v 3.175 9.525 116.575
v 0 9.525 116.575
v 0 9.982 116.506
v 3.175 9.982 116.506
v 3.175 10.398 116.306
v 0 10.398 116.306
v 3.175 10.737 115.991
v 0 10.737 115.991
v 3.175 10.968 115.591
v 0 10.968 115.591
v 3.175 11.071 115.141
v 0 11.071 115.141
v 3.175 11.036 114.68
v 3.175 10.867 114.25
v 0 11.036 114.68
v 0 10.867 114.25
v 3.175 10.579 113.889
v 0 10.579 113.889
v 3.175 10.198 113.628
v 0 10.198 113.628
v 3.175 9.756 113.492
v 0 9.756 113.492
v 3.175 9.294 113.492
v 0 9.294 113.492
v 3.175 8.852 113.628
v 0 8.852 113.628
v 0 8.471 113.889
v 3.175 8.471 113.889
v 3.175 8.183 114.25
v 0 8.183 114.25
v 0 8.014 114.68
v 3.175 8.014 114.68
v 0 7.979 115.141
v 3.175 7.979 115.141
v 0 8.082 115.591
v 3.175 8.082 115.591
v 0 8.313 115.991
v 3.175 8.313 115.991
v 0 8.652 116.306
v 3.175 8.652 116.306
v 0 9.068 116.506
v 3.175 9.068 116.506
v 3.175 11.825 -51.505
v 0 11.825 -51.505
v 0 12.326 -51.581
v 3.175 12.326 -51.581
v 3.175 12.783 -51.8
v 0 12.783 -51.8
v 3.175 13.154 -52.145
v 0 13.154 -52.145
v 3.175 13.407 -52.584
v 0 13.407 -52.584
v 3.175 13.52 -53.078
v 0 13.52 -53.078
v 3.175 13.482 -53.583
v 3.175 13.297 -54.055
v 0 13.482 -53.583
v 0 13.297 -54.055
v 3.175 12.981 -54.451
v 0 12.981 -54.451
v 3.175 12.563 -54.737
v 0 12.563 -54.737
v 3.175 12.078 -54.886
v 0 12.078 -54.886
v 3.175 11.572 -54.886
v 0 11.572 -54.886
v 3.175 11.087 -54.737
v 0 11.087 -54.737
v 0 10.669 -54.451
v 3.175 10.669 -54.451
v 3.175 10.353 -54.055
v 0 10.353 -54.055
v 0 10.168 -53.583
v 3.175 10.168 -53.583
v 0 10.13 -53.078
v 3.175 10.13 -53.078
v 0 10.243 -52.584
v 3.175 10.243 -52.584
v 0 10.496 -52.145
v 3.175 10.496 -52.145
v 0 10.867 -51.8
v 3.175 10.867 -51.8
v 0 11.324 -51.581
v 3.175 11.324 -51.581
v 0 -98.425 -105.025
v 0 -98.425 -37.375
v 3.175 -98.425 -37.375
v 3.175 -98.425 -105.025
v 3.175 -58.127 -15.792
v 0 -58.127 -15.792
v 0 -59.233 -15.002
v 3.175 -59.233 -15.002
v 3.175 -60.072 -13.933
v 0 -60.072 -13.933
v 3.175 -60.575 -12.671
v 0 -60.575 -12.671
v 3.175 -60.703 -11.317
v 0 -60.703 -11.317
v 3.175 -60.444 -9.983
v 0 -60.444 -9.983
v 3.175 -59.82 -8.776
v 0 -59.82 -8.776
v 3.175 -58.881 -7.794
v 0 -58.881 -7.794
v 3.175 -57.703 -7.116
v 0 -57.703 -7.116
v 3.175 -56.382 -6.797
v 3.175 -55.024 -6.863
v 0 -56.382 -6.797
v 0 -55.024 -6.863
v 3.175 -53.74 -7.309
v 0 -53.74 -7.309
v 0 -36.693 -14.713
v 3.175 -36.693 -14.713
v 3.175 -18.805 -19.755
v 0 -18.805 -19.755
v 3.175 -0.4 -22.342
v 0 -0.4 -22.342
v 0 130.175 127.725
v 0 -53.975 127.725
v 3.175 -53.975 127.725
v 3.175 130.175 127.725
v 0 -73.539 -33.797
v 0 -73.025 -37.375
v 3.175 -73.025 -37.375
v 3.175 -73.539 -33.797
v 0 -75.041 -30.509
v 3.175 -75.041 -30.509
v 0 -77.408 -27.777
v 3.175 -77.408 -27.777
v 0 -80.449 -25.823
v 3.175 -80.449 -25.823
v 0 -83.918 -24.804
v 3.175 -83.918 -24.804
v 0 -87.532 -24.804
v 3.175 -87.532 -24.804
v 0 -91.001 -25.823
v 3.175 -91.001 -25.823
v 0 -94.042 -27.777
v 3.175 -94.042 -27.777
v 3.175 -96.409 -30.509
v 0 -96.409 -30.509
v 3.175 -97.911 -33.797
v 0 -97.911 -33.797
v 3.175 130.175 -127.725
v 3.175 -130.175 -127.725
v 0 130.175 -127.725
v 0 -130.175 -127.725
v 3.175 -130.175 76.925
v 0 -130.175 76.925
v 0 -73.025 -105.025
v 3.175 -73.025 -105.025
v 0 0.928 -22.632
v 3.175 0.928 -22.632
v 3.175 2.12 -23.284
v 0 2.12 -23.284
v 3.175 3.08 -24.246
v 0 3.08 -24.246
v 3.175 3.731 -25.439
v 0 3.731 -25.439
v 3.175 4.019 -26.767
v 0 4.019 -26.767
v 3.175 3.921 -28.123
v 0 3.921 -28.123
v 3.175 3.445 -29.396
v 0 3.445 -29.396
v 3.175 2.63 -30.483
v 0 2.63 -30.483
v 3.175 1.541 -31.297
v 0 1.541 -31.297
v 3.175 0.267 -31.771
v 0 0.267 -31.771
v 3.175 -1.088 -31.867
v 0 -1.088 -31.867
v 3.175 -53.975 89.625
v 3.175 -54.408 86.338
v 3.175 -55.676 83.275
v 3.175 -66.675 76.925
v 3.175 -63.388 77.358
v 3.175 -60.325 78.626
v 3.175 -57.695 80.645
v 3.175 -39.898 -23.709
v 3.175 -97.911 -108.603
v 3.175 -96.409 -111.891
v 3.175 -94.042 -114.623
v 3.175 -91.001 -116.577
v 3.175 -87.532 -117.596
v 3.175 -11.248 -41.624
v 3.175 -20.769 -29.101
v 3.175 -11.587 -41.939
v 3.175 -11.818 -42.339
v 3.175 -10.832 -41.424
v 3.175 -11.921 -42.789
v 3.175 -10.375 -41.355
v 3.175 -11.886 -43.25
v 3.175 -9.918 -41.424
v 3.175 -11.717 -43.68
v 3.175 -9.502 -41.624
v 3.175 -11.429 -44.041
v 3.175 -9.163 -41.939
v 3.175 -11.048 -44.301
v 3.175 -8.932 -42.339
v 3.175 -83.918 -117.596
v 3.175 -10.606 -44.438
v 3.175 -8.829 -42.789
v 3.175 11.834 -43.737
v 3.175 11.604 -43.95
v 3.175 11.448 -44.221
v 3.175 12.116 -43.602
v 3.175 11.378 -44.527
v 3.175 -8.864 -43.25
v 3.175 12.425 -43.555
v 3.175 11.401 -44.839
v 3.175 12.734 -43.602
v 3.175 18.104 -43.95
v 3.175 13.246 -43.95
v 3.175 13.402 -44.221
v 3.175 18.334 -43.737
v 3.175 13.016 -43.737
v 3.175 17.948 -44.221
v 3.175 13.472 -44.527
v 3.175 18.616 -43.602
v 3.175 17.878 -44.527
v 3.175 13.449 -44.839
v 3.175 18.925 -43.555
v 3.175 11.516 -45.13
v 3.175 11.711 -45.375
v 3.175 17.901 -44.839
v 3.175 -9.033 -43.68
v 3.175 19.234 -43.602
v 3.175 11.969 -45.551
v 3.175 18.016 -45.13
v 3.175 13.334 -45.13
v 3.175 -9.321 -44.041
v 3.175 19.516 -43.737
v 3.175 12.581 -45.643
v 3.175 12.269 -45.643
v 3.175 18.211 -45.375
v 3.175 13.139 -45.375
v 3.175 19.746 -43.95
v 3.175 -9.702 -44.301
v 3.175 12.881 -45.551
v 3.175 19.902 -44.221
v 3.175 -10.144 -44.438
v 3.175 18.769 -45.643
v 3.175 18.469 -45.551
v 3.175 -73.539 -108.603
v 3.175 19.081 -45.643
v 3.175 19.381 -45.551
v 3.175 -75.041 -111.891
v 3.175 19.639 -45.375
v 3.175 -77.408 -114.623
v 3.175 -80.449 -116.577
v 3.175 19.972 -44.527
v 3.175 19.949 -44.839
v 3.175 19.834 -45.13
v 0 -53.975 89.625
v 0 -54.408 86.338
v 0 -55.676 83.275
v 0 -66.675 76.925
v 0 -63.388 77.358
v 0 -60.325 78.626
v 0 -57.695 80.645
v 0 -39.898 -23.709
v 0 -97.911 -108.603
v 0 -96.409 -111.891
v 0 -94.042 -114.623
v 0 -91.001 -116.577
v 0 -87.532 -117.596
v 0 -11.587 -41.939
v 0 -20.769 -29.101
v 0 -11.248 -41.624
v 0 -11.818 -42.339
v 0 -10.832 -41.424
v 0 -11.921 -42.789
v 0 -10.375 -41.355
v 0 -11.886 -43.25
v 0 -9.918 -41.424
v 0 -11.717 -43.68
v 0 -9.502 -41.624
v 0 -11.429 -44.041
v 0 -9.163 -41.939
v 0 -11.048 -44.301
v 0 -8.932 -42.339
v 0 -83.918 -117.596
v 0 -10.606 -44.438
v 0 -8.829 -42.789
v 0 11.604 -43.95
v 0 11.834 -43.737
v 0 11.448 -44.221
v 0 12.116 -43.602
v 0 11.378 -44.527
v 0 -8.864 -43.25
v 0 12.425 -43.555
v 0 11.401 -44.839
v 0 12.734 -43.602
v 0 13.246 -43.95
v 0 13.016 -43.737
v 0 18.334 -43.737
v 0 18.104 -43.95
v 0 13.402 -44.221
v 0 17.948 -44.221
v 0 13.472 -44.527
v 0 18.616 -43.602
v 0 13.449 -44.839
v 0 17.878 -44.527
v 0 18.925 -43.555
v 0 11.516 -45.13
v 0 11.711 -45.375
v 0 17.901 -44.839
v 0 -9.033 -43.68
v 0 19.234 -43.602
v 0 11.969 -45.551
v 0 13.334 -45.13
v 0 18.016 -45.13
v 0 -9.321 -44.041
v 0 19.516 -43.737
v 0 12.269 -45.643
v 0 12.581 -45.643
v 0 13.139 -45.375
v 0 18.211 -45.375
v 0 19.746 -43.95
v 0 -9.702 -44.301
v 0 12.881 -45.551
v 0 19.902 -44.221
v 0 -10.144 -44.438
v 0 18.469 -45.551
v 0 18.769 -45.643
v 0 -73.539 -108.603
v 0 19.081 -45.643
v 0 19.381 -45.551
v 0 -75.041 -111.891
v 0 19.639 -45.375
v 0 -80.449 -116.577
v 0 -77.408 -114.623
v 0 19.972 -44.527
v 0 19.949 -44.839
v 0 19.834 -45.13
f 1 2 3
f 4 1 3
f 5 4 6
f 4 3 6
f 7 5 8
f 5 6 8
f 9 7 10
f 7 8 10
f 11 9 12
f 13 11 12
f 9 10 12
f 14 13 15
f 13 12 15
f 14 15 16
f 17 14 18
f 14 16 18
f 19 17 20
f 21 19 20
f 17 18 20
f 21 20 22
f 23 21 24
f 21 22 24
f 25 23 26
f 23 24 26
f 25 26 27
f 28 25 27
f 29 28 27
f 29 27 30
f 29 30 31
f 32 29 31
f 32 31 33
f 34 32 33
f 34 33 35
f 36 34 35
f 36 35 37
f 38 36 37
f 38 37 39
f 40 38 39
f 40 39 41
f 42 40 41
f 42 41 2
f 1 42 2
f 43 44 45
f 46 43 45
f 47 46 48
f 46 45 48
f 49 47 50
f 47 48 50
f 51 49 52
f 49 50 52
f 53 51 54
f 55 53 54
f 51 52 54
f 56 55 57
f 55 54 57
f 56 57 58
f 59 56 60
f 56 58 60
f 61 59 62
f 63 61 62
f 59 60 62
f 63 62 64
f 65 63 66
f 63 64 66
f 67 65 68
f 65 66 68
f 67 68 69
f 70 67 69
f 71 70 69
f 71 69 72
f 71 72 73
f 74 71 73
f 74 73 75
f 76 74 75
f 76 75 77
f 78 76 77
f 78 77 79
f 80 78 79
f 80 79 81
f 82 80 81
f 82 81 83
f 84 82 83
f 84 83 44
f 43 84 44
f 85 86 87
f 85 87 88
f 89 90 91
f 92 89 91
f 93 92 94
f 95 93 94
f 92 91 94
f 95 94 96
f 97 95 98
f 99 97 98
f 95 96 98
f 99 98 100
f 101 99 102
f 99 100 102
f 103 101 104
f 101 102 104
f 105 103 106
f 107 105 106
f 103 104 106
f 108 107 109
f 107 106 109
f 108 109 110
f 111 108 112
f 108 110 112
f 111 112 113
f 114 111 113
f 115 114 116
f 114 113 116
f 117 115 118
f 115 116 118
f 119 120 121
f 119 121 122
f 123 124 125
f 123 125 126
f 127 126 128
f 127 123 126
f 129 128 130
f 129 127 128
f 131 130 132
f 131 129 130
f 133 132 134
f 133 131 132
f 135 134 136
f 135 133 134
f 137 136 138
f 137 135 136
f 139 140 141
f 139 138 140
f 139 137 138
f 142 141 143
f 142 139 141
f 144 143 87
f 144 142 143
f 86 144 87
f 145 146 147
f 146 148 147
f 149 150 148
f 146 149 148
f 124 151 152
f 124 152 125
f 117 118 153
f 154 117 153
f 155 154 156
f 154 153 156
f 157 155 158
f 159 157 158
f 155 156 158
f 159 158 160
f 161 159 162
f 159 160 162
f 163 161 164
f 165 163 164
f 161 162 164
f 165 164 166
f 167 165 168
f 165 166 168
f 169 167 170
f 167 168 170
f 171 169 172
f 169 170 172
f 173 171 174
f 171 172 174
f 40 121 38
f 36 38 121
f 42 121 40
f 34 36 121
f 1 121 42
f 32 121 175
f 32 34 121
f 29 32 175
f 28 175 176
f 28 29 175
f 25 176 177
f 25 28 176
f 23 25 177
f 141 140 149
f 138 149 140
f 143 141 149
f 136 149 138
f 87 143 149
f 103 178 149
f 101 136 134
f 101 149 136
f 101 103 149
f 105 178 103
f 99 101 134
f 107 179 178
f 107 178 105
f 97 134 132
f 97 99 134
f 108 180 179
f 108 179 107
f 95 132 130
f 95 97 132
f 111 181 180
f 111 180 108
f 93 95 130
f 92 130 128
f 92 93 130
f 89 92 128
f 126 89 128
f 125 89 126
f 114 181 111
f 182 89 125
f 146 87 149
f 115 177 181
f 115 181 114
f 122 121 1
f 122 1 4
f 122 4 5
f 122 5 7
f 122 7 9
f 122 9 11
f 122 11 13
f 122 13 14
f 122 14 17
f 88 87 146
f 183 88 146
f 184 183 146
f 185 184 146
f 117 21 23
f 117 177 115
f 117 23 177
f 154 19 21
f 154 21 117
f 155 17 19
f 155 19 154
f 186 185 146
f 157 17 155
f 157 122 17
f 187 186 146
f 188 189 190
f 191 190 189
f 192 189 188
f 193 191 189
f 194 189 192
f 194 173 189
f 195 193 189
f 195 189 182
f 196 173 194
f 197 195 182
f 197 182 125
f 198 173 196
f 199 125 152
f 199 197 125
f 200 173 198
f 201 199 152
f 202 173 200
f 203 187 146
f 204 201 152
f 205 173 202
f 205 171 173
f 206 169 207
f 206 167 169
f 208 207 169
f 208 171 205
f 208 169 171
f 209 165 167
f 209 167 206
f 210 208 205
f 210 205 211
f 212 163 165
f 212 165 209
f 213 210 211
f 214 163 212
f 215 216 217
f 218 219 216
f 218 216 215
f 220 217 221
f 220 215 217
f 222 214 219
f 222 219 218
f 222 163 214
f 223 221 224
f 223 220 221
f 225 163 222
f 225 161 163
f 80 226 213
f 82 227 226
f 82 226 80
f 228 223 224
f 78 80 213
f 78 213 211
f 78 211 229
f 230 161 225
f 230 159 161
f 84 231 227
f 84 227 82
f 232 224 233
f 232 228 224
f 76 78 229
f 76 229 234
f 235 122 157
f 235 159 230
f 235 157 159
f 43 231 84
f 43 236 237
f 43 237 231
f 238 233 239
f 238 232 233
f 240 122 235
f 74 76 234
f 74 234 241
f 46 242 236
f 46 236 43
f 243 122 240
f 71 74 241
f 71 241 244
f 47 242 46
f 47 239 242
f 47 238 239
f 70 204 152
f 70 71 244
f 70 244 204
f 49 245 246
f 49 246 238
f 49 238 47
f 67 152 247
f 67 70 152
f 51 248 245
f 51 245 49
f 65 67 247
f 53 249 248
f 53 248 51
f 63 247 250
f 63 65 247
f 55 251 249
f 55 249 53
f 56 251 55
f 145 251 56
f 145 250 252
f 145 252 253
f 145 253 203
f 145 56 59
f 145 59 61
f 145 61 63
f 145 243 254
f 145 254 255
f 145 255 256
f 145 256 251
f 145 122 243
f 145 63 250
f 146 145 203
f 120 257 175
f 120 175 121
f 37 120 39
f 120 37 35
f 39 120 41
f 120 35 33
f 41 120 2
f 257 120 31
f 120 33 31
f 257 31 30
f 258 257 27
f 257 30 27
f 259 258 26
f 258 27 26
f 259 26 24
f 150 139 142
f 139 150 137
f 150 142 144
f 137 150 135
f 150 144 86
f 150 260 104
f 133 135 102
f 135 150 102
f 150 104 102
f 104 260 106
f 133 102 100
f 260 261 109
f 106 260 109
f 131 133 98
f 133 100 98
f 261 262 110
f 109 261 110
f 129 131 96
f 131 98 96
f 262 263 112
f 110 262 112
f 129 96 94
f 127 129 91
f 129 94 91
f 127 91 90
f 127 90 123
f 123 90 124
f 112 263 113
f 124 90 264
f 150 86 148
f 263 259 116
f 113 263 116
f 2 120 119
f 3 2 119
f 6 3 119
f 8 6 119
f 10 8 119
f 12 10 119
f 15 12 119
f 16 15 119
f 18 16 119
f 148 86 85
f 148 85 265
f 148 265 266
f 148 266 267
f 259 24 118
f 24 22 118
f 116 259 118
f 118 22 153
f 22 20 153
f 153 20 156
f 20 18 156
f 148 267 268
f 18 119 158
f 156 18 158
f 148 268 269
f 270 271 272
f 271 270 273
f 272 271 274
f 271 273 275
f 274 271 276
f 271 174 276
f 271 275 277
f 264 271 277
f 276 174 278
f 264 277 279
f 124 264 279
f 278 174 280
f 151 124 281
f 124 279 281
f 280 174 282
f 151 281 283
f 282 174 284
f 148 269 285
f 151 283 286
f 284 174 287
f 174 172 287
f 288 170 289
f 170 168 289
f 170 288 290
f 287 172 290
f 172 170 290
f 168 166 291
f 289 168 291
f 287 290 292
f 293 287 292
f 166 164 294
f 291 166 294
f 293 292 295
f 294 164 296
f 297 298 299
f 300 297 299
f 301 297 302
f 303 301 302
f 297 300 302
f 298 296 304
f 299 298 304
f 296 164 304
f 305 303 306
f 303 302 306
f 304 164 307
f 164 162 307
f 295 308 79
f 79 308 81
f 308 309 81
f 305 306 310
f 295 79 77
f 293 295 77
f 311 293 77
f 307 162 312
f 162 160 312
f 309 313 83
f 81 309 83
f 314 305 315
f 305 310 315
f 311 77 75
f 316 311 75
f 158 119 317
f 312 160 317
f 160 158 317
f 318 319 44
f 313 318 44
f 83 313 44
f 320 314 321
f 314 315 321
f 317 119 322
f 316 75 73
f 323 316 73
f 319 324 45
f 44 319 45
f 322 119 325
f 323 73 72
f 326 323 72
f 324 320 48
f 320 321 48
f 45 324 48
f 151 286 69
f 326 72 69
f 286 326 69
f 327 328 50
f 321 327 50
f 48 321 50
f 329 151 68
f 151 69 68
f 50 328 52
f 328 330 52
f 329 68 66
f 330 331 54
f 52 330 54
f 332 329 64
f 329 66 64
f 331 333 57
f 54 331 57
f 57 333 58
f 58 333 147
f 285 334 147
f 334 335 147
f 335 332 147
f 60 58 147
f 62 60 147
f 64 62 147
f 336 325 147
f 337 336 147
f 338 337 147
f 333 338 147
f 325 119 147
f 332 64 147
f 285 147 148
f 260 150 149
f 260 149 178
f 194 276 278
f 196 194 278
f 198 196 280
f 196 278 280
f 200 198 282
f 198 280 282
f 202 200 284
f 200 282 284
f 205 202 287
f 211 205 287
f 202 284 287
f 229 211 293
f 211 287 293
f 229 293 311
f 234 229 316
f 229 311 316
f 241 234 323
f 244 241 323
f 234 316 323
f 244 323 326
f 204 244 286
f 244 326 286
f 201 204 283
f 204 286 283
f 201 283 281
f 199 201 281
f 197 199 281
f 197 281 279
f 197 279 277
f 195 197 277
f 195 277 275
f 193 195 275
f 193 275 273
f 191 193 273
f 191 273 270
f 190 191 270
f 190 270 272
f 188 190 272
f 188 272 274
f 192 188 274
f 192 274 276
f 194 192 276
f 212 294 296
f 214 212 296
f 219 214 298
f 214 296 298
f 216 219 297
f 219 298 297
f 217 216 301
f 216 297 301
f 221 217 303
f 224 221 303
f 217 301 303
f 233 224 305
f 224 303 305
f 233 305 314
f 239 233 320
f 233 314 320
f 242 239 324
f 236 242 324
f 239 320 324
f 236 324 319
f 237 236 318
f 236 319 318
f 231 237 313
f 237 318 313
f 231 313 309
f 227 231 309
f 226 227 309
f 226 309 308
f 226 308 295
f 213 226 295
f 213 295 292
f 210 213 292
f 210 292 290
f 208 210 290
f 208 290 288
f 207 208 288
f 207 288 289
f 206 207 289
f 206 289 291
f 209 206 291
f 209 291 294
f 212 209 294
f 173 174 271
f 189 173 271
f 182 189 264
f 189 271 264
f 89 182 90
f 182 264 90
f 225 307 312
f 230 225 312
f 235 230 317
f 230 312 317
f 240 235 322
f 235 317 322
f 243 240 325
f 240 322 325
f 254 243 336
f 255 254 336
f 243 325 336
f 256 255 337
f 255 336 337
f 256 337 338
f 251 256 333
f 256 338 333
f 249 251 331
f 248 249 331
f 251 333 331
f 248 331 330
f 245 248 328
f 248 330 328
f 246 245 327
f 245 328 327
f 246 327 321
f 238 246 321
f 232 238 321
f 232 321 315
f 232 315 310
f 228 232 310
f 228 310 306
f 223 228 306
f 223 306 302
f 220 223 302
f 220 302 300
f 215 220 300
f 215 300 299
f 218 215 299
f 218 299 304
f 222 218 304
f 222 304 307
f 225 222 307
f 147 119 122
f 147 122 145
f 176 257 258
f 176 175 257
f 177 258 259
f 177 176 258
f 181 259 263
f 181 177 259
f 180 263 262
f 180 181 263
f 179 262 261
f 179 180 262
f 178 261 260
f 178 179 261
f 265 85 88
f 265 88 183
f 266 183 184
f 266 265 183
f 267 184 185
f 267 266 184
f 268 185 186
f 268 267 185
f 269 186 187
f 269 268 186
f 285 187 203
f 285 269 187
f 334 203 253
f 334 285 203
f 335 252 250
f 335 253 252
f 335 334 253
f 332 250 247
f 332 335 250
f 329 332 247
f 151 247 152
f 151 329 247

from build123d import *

# Parameters (mm, degrees)
SKETCH1_W           = 255.45
SKETCH1_H           = 260.35
BOSS_EXTRUDE1_DEPTH = 3.175
SKETCH2_W           = 255.45
SKETCH2_H           = 6.35
BOSS_EXTRUDE2_DEPTH = 12.7
CUT_EXTRUDE1_DEPTH  = 16.875
SKETCH5_W           = 54.590141408
SKETCH5_H           = 33.859166417
CUT_EXTRUDE2_DEPTH  = 256.45
SKETCH8_R           = 1.55
SKETCH8_R_2         = 1.6999966
SKETCH8_R_3         = 1.5499969
SKETCH8_R_4         = 1.05
CUT_EXTRUDE7_DEPTH  = 4.175
SKETCH9_W           = 50.8
SKETCH9_H           = 76.2
CUT_EXTRUDE8_DEPTH  = 4.175
FILLET1_R           = 12.7
CUT_EXTRUDE9_DEPTH  = 4.175


with BuildPart() as part:
    # Sketch1 → Boss-Extrude1 (new body)
    with BuildSketch(Plane(origin=(0, 0, 0), x_dir=(0, 0, -1), z_dir=(1, 0, 0))):
        Rectangle(SKETCH1_W, SKETCH1_H)
    extrude(amount=BOSS_EXTRUDE1_DEPTH)

    # Sketch2 → Boss-Extrude2 (add)
    with BuildSketch(Plane(origin=(3.175, 0, 0), x_dir=(0, 0, -1), z_dir=(1, 0, 0))):
        with Locations((0, 127)):
            Rectangle(SKETCH2_W, SKETCH2_H)
    extrude(amount=BOSS_EXTRUDE2_DEPTH)

    # Sketch3 → Cut-Extrude1 (cut, through all)
    with BuildSketch(Plane.ZY):
        with BuildLine():
            Line((-105.025, -73.025), (-37.375, -73.025))
            ThreePointArc((-37.375, -73.025), (-24.675, -85.725), (-37.375, -98.425))
            Line((-37.375, -98.425), (-105.025, -98.425))
            ThreePointArc((-105.025, -98.425), (-117.725, -85.725), (-105.025, -73.025))
        make_face()
    extrude(amount=-CUT_EXTRUDE1_DEPTH, mode=Mode.SUBTRACT)

    # Sketch5 → Cut-Extrude2 (cut, through all)
    with BuildSketch(Plane(origin=(0, 0, -127.725), x_dir=(-1, 0, 0), z_dir=(0, 0, -1))):
        with Locations((-30.470070704, 140.754583209)):
            Rectangle(SKETCH5_W, SKETCH5_H)
    extrude(amount=-CUT_EXTRUDE2_DEPTH, mode=Mode.SUBTRACT)

    # Sketch8 → Cut-Extrude7 (cut, through all)
    with BuildSketch(Plane.ZY):
        with Locations((115.025, 9.525)):
            Circle(SKETCH8_R)
        with Locations((-53.205, 11.825)):
            Circle(SKETCH8_R_2)
        with Locations((-42.9049952, -10.375)):
            Circle(SKETCH8_R_3)
        with Locations((-44.605, 18.925)):
            Circle(SKETCH8_R_4)
        with Locations((-44.605, 12.425)):
            Circle(SKETCH8_R_4)
    extrude(amount=-CUT_EXTRUDE7_DEPTH, mode=Mode.SUBTRACT)

    # Sketch9 → Cut-Extrude8 (cut, through all)
    with BuildSketch(Plane.ZY):
        with Locations((102.325, -92.075)):
            Rectangle(SKETCH9_W, SKETCH9_H)
    extrude(amount=-CUT_EXTRUDE8_DEPTH, mode=Mode.SUBTRACT)

    # Fillet1
    fillet1_edges = [part.edges().sort_by_distance(p)[0] for p in [
        (1.5875, -53.975, 76.925),
    ]]
    fillet(fillet1_edges, radius=FILLET1_R)

    # Sketch10 → Cut-Extrude9 (cut, through all)
    with BuildSketch(Plane.ZY):
        with BuildLine():
            ThreePointArc((-15.792035743, -58.127079483), (-9.357313119, -60.175), (-7.309392602, -53.740277376))
            ThreePointArc((-7.309392602, -53.740277376), (-17.536268555, -27.834189149), (-22.341982218, -0.400277376))
            ThreePointArc((-22.341982218, -0.400277376), (-27.448590626, 4.018114216), (-31.866982218, -1.088494191))
            ThreePointArc((-31.866982218, -1.088494191), (-26.728041298, -30.424668105), (-15.792035743, -58.127079483))
        make_face()
    extrude(amount=-CUT_EXTRUDE9_DEPTH, mode=Mode.SUBTRACT)


solid = part.part
